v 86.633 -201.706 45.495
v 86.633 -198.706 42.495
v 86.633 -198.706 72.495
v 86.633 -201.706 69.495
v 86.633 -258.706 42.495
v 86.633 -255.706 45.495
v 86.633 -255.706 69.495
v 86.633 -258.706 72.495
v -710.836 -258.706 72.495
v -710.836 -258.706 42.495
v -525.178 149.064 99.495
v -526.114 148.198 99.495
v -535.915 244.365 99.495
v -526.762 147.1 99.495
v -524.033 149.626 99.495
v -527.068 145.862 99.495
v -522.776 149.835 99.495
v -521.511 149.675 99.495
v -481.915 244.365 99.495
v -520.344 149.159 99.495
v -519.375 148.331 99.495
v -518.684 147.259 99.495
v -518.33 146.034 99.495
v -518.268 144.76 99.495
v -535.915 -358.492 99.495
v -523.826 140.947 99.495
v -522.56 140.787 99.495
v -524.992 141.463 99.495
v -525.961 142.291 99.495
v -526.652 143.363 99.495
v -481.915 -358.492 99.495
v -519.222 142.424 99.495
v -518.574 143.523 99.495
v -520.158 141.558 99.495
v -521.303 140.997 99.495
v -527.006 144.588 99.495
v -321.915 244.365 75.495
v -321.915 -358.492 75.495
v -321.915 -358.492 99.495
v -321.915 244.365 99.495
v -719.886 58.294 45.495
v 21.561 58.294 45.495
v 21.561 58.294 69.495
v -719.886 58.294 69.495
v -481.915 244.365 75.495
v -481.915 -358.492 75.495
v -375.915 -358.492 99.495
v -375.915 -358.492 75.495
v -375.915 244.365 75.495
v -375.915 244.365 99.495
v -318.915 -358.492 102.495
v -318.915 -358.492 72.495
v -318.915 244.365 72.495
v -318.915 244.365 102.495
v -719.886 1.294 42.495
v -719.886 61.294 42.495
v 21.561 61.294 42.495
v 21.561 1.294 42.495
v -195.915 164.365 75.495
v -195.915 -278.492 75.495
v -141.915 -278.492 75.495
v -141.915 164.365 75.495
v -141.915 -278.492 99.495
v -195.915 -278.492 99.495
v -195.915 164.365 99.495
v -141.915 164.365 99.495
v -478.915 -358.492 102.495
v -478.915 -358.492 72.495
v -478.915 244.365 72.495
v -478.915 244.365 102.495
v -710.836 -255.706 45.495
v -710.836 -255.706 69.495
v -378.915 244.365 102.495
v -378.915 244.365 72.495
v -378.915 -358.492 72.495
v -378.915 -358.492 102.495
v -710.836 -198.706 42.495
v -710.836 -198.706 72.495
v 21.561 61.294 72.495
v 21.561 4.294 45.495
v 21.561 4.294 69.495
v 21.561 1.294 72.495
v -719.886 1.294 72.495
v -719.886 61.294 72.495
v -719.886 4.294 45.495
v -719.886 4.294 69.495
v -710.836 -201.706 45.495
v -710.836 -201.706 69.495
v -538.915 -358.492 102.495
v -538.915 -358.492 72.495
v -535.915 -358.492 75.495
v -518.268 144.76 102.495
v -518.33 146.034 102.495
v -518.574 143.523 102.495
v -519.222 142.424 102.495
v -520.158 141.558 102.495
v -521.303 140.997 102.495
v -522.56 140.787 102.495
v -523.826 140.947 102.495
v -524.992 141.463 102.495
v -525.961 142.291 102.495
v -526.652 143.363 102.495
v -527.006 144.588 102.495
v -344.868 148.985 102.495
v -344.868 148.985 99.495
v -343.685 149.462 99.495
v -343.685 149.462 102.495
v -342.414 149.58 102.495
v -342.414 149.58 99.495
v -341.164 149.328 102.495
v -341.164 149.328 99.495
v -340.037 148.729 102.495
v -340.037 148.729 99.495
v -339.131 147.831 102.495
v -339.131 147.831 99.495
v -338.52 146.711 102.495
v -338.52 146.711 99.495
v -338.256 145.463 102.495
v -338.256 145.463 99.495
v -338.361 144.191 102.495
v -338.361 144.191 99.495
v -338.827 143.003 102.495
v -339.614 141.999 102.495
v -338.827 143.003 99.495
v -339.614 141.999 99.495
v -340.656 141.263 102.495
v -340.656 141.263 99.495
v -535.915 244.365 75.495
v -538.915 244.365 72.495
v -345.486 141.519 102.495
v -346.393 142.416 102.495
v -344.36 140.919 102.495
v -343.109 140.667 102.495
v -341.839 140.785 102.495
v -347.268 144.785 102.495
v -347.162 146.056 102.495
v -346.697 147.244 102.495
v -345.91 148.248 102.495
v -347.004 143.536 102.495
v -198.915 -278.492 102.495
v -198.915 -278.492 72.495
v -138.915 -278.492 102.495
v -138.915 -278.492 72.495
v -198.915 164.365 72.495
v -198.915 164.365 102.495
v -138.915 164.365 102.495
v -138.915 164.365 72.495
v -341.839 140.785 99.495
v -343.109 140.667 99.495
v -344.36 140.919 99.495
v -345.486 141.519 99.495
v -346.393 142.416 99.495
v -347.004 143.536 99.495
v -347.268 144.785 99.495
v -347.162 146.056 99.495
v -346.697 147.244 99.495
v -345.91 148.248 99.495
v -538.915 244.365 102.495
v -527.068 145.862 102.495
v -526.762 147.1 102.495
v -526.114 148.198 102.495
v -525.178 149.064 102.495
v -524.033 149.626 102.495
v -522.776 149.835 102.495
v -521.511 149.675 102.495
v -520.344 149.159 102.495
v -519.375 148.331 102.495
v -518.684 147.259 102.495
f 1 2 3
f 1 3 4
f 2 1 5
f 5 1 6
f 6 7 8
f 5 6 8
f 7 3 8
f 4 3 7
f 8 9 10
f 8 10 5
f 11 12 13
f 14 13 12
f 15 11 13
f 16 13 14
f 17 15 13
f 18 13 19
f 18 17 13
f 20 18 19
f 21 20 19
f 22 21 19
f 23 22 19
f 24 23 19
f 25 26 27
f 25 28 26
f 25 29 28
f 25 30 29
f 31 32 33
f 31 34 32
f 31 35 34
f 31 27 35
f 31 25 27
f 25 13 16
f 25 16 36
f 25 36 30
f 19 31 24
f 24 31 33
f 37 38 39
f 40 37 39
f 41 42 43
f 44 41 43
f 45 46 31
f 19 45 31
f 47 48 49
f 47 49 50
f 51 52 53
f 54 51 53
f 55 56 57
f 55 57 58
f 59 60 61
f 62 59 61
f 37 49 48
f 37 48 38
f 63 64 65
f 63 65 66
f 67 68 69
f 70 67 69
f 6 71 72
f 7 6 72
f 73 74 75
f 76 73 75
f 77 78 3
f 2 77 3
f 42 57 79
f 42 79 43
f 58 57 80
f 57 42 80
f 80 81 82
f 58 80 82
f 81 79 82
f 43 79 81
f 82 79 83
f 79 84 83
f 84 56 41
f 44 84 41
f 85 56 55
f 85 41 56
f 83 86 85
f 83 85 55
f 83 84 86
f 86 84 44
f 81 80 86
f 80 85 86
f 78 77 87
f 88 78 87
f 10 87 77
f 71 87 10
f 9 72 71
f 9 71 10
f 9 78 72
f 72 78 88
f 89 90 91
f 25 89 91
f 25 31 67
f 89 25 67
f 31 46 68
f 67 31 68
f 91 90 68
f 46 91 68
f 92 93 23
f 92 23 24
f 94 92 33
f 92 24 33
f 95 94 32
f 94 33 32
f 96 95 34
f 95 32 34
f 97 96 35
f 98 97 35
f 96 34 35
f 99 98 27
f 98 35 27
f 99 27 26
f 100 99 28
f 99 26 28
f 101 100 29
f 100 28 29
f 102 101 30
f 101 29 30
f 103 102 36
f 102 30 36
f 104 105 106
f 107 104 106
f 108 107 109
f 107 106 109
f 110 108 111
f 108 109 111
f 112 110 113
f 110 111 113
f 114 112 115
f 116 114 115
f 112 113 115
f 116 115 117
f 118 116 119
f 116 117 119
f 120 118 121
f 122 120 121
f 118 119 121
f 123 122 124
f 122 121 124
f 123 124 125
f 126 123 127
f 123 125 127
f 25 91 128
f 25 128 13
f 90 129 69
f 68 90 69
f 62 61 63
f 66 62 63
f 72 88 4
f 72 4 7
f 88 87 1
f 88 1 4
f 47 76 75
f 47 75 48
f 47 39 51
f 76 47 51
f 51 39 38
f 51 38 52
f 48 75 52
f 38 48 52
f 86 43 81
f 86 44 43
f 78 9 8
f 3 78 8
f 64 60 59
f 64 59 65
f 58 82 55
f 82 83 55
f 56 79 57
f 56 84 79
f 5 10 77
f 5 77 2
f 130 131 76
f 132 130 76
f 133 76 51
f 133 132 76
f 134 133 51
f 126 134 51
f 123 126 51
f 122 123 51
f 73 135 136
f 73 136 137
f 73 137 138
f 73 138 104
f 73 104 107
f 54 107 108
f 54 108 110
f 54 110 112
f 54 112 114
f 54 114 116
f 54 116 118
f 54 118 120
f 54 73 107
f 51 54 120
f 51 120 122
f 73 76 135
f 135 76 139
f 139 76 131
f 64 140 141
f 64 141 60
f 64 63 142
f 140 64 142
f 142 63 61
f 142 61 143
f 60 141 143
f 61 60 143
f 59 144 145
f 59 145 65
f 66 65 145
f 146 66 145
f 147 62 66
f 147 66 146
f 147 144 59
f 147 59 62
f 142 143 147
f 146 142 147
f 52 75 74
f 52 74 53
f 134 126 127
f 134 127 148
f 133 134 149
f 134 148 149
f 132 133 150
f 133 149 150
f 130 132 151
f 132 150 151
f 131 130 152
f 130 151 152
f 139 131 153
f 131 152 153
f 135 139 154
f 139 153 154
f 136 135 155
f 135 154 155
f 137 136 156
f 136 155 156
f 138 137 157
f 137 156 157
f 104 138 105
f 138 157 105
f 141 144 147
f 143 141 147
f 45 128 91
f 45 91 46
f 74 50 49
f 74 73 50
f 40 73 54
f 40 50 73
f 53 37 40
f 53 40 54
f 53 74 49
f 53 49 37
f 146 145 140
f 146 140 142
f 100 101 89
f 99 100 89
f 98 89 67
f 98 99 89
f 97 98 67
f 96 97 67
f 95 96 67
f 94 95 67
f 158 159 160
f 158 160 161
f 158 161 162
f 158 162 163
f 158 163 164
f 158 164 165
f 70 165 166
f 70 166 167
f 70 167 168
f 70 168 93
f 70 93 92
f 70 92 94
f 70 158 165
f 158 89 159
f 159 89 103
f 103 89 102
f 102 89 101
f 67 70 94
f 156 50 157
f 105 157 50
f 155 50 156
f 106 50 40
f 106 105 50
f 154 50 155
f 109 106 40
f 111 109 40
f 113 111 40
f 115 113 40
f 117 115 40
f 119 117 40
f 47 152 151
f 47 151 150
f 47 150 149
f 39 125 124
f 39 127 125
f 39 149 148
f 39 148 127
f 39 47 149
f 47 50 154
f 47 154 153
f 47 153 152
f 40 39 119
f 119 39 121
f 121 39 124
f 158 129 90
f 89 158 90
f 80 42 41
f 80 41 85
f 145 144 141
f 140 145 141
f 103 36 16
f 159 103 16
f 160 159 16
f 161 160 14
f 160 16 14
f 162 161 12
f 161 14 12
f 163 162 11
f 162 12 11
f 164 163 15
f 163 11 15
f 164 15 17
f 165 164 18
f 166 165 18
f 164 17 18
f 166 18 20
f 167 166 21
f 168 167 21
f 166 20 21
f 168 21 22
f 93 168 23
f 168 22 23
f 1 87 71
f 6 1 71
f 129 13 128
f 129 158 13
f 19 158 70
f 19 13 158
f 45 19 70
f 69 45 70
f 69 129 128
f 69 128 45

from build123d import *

# Parameters (mm, degrees)
F0_W        = 60
F0_H        = 30
F1_DEPTH    = 158
F2_W        = 66.2892647088
F2_H        = 29.4618904591
F3_DEPTH    = 300
F2_W_2      = 68.393683061
F2_H_2      = 30.5141024292
F2_W_3      = 67.3414766788
F4_W        = 47.0454245806
F4_H        = 22.7635130286
F5_DEPTH    = 400
F4_W_2      = 49.3977004662
F4_H_2      = 23.8089710474
F6_DEPTH    = 50
F7_W        = 61.1065607518
F7_H        = 23.5696807504
F8_DEPTH    = 300
F9_W        = 60.6583654881
F9_H        = 23.7780623138
F9_W_2      = 61.8215240538
F9_H_2      = 23.7314254045
F10_DEPTH   = 300.001
F11_W       = 61.2598918378
F11_H       = 23.6744321883
F12_DEPTH   = 300.001
F13_W       = 41.8233666569
F13_H       = 17.940826714
F14_DEPTH   = 450.001
F15_W       = 0.6950423121
F15_H       = 16.4160877466
F15_W_2     = 41.8233666569
F15_W_3     = 0.0805514865
F16_DEPTH   = 450.001
F18_R       = 8.0737977812
F18_R_2     = 2.2693206324
F19_DEPTH   = 10
F21_W       = 60
F21_H       = 177.2603205867
F21_H_2     = 60
F21_H_3     = 180
F21_H_4     = 125.5965695061
F22_DEPTH   = 30
F21_H_5     = 97.260340693
F21_H_6     = 45.5965896123
F23_W       = 797.4684381369
F23_H       = 60
F24_DEPTH   = 30
F23_W_2     = 826.1469494374
F25_W       = 54.0000002086
F25_H       = 24.0000002086
F26_DEPTH   = 877.8865025663
F27_W       = 54.0000002086
F27_H       = 24.0000002086
F28_DEPTH   = 868.8368023466
F29_W       = 54.000005275
F29_H       = 24.000005275
F30_DEPTH   = 602.8578900928
F31_W       = 54.000005275
F31_H       = 24.000005275
F32_DEPTH   = 602.8578900928
F33_W       = 54.000005275
F33_H       = 24.000005275
F34_DEPTH   = 522.857910199
F35_DEPTH   = 153.3
F37_DEPTH   = 68.6
F40_D       = 8.8
F40_DEPTH   = 16.5
F40_TIP     = 2.6437867237
F40_2_D     = 8.8
F40_2_DEPTH = 16.5
F40_2_TIP   = 2.6437867237
F41_D       = 8.8
F41_DEPTH   = 16.5
F41_TIP     = 2.6437867237
F41_2_D     = 8.8
F41_2_DEPTH = 16.5
F41_2_TIP   = 2.6437867237


# Not quite as in the source:
# - a feature names something its author has since deleted; it is built from what else it names


with BuildPart() as f1:
    # F0 (on Right) → F1 (new body)
    with BuildSketch(Plane.YZ):
        with Locations((-26.7016614429, 57.4951861054)):
            Rectangle(F0_W, F0_H)
    extrude(amount=F1_DEPTH)


with BuildPart() as f3:
    # F2 (on face) → F3 (new body)
    with BuildSketch(Plane.XZ.offset(56.7016614429)):
        with Locations((-55.3080569953, -72.8603079915)):
            Rectangle(F2_W, F2_H)
    extrude(amount=-F3_DEPTH)

    # F7 (on face) → F8 (cut, through all)
    with BuildSketch(Plane.XZ.offset(56.7016614429)):
        with Locations((-55.1617154852, -72.5816227496)):
            Rectangle(F7_W, F7_H)
    extrude(amount=-F8_DEPTH, mode=Mode.SUBTRACT)


with BuildPart() as f3b:
    # F2 (on face) → F3, piece 2 (new body)
    with BuildSketch(Plane.XZ.offset(56.7016614429)):
        with Locations((56.2262581661, -72.3342020065)):
            Rectangle(F2_W_2, F2_H_2)
    extrude(amount=-F3_DEPTH)


with BuildPart() as f3c:
    # F2 (on face) → F3, piece 3 (new body)
    with BuildSketch(Plane.XZ.offset(56.7016614429)):
        with Locations((181.9654107094, -72.3342020065)):
            Rectangle(F2_W_3, F2_H_2)
    extrude(amount=-F3_DEPTH)


with BuildPart() as f5:
    # F4 (on face) → F5 (new body)
    with BuildSketch(Plane(origin=(-88.4526893497, 0, 0), x_dir=(0, -1, 0), z_dir=(-1, 0, 0))):
        with Locations((-189.4800886512, -98.9730097353)):
            Rectangle(F4_W, F4_H)
    extrude(amount=-F5_DEPTH)


with BuildPart() as f5b:
    # F4 (on face) → F5, piece 2 (new body)
    with BuildSketch(Plane(origin=(-88.4526893497, 0, 0), x_dir=(0, -1, 0), z_dir=(-1, 0, 0))):
        with Locations((-13.9745208435, -99.4957387447)):
            Rectangle(F4_W_2, F4_H_2)
    extrude(amount=-F5_DEPTH)


with BuildPart() as f6:
    # F6 (new): a face of the model
    f6_faces = [f5.part.faces().sort_by_distance(p)[0] for p in [
        (-88.4526893497, 189.4800886512, -98.9730097353),
    ]]
    extrude(f6_faces, amount=F6_DEPTH)


with BuildPart() as f6b:
    # F6#2 (new): a face of the model
    f6_2_faces = [f5b.part.faces().sort_by_distance(p)[0] for p in [
        (-88.4526893497, 13.9745208435, -99.4957387447),
    ]]
    extrude(f6_2_faces, amount=F6_DEPTH)


with BuildPart() as f10_tool:
    # F9 (on face) → F10 (new body, through all)
    with BuildSketch(Plane.XZ.offset(56.7016614429)):
        with Locations((181.9215863943, -72.4789816886)):
            Rectangle(F9_W, F9_H)
        with Locations((56.3811119646, -72.2706690431)):
            Rectangle(F9_W_2, F9_H_2)
    extrude(amount=-F10_DEPTH)


with BuildPart() as f3b_1:
    add(f3b.part)

    # F10: cut by f10_tool
    add(f10_tool.part, mode=Mode.SUBTRACT)

    # F11 (on face) → F12 (cut, through all)
    with BuildSketch(Plane.XZ.offset(56.7016614429)):
        with Locations((55.9759307653, -72.5225340575)):
            Rectangle(F11_W, F11_H)
    extrude(amount=-F12_DEPTH, mode=Mode.SUBTRACT)


with BuildPart() as f3c_1:
    add(f3c.part)

    # F10: cut by f10_tool
    add(f10_tool.part, mode=Mode.SUBTRACT)


with BuildPart() as f14_tool:
    # F13 (on face) → F14 (new body, through all)
    with BuildSketch(Plane.YZ.offset(311.5473106503)):
        with Locations((13.9583600685, -99.7032783926)):
            Rectangle(F13_W, F13_H)
    extrude(amount=-F14_DEPTH)


with BuildPart() as f5b_1:
    add(f5b.part)

    # F14: cut by f14_tool
    add(f14_tool.part, mode=Mode.SUBTRACT)


with BuildPart() as f6b_1:
    add(f6b.part)

    # F14: cut by f14_tool
    add(f14_tool.part, mode=Mode.SUBTRACT)


with BuildPart() as f16_tool:
    # F15 (on face) → F16 (new body, through all)
    with BuildSketch(Plane(origin=(-138.4526893497, 0, 0), x_dir=(0, -1, 0), z_dir=(-1, 0, 0))):
        with Locations((-35.217564553, -99.4463041425)):
            Rectangle(F15_W, F15_H)
        with Locations((-13.9583600685, -99.4463041425)):
            Rectangle(F15_W_2, F15_H)
        with Locations((6.9935990032, -99.4463041425)):
            Rectangle(F15_W_3, F15_H)
    extrude(amount=-F16_DEPTH)


with BuildPart() as f5b_2:
    add(f5b_1.part)

    # F16: cut by f16_tool
    add(f16_tool.part, mode=Mode.SUBTRACT)


with BuildPart() as f6b_2:
    add(f6b_1.part)

    # F16: cut by f16_tool
    add(f16_tool.part, mode=Mode.SUBTRACT)


with BuildPart() as f19:
    # F18 (on face) → F19 (new body)
    with BuildSketch(Plane.XY.offset(72.4951861054)):
        with Locations((62.8524050117, -9.2268595472)):
            Circle(F18_R)
        with Locations((59.0920038521, -6.9042602554)):
            Circle(F18_R_2, mode=Mode.SUBTRACT)
    extrude(amount=F19_DEPTH)


with BuildPart() as f22:
    # F21 (on face) → F22 (new body)
    with BuildSketch(Plane.XY.offset(72.4951861054)):
        with Locations((-508.9146799214, 155.734451874)):
            Rectangle(F21_W, F21_H)
        with Locations((-508.9146799214, 37.1042915806)):
            Rectangle(F21_W, F21_H_2)
        with Locations((-508.9146799214, -82.8957084194)):
            Rectangle(F21_W, F21_H_3)
        with Locations((-508.9146799214, -202.8957084194)):
            Rectangle(F21_W, F21_H_2)
        with Locations((-508.9146799214, -295.6939931724)):
            Rectangle(F21_W, F21_H_4)
    extrude(amount=F22_DEPTH)

    # F29 (on face) → F30 (cut, through all)
    with BuildSketch(Plane.XZ.offset(358.4922779254)):
        with Locations((-508.9146799214, 87.4951861054)):
            Rectangle(F29_W, F29_H)
    extrude(amount=-F30_DEPTH, mode=Mode.SUBTRACT)

    # F40
    with Locations(Plane.XY.offset(102.4951861054)):
        with Locations((-522.6472080988, 145.1861311495), (-342.6472080988, 145.1861311495)):
            Hole(F40_D / 2, depth=F40_DEPTH)
            with Locations((0, 0, -(F40_DEPTH + F40_TIP / 2))):  # 118° drill point
                Cone(0, F40_D / 2, F40_TIP, mode=Mode.SUBTRACT)

    # F41
    with Locations(Plane.XY.offset(102.4951861054)):
        with Locations((-522.6888656616, 145.43607831), (-342.8764343262, 145.0610905886)):
            Hole(F41_D / 2, depth=F41_DEPTH)
            with Locations((0, 0, -(F41_DEPTH + F41_TIP / 2))):  # 118° drill point
                Cone(0, F41_D / 2, F41_TIP, mode=Mode.SUBTRACT)


with BuildPart() as f22b:
    # F21 (on face) → F22, piece 2 (new body)
    with BuildSketch(Plane.XY.offset(72.4951861054)):
        with Locations((-348.9146799214, -295.6939931724)):
            Rectangle(F21_W, F21_H_4)
        with Locations((-348.9146799214, -202.8957084194)):
            Rectangle(F21_W, F21_H_2)
        with Locations((-348.9146799214, -82.8957084194)):
            Rectangle(F21_W, F21_H_3)
        with Locations((-348.9146799214, 37.1042915806)):
            Rectangle(F21_W, F21_H_2)
        with Locations((-348.9146799214, 155.734451874)):
            Rectangle(F21_W, F21_H)
    extrude(amount=F22_DEPTH)

    # F31 (on face) → F32 (cut, through all)
    with BuildSketch(Plane.XZ.offset(358.4922779254)):
        with Locations((-348.9146799214, 87.4951861054)):
            Rectangle(F31_W, F31_H)
    extrude(amount=-F32_DEPTH, mode=Mode.SUBTRACT)

    # F40#2
    with Locations(Plane.XY.offset(102.4951861054)):
        with Locations((-522.6472080988, 145.1861311495), (-342.6472080988, 145.1861311495)):
            Hole(F40_2_D / 2, depth=F40_2_DEPTH)
            with Locations((0, 0, -(F40_2_DEPTH + F40_2_TIP / 2))):  # 118° drill point
                Cone(0, F40_2_D / 2, F40_2_TIP, mode=Mode.SUBTRACT)

    # F41#2
    with Locations(Plane.XY.offset(102.4951861054)):
        with Locations((-522.6888656616, 145.43607831), (-342.8764343262, 145.0610905886)):
            Hole(F41_2_D / 2, depth=F41_2_DEPTH)
            with Locations((0, 0, -(F41_2_DEPTH + F41_2_TIP / 2))):  # 118° drill point
                Cone(0, F41_2_D / 2, F41_2_TIP, mode=Mode.SUBTRACT)


with BuildPart() as f22c:
    # F21 (on face) → F22, piece 3 (new body)
    with BuildSketch(Plane.XY.offset(72.4951861054)):
        with Locations((-168.9146799214, 115.7344619271)):
            Rectangle(F21_W, F21_H_5)
        with Locations((-168.9146799214, 37.1042915806)):
            Rectangle(F21_W, F21_H_2)
        with Locations((-168.9146799214, -82.8957084194)):
            Rectangle(F21_W, F21_H_3)
        with Locations((-168.9146799214, -202.8957084194)):
            Rectangle(F21_W, F21_H_2)
        with Locations((-168.9146799214, -255.6940032255)):
            Rectangle(F21_W, F21_H_6)
    extrude(amount=F22_DEPTH)

    # F33 (on face) → F34 (cut, through all)
    with BuildSketch(Plane.XZ.offset(278.4922980317)):
        with Locations((-168.9146799214, 87.4951861054)):
            Rectangle(F33_W, F33_H)
    extrude(amount=-F34_DEPTH, mode=Mode.SUBTRACT)


with BuildPart() as f24:
    # F23 (on face) → F24 (new body)
    with BuildSketch(Plane(origin=(0, 0, 72.4951861054), x_dir=(1, 0, 0), z_dir=(0, 0, -1))):
        with Locations((-312.1015832781, 228.705952694)):
            Rectangle(F23_W, F23_H)
    extrude(amount=F24_DEPTH)

    # F27 (on face) → F28 (cut, through all)
    with BuildSketch(Plane(origin=(-710.8358023466, 0, 0), x_dir=(0, -1, 0), z_dir=(-1, 0, 0))):
        with Locations((228.705952694, 57.4951861054)):
            Rectangle(F27_W, F27_H)
    extrude(amount=-F28_DEPTH, mode=Mode.SUBTRACT)


with BuildPart() as f24b:
    # F23 (on face) → F24, piece 2 (new body)
    with BuildSketch(Plane(origin=(0, 0, 72.4951861054), x_dir=(1, 0, 0), z_dir=(0, 0, -1))):
        with Locations((-306.8120278476, -31.294047306)):
            Rectangle(F23_W_2, F23_H)
    extrude(amount=F24_DEPTH)

    # F25 (on face) → F26 (cut, through all)
    with BuildSketch(Plane(origin=(-719.8855025663, 0, 0), x_dir=(0, -1, 0), z_dir=(-1, 0, 0))):
        with Locations((-31.294047306, 57.4951861054)):
            Rectangle(F25_W, F25_H)
    extrude(amount=-F26_DEPTH, mode=Mode.SUBTRACT)


with BuildPart() as f35_tool:
    # F35 (cut): a face of the model
    f35_faces = [f24b.part.faces().sort_by_distance(p)[0] for p in [
        (106.2614468711, 60.6232269128, 57.4951861054),
    ]]
    extrude(f35_faces, amount=-F35_DEPTH)


with BuildPart() as f1_1:
    add(f1.part)

    # F35: cut by f35_tool
    add(f35_tool.part, mode=Mode.SUBTRACT)


with BuildPart() as f24b_1:
    add(f24b.part)

    # F35: cut by f35_tool
    add(f35_tool.part, mode=Mode.SUBTRACT)

    # F37 (add): a face of the model
    f37_faces = [f24b_1.faces().sort_by_distance(p)[0] for p in [
        (-47.0385531289, 60.6232269128, 57.4951861054),
    ]]
    extrude(f37_faces, amount=F37_DEPTH)


solid = Compound([f22.part, f22b.part, f22c.part, f24.part, f24b_1.part])
